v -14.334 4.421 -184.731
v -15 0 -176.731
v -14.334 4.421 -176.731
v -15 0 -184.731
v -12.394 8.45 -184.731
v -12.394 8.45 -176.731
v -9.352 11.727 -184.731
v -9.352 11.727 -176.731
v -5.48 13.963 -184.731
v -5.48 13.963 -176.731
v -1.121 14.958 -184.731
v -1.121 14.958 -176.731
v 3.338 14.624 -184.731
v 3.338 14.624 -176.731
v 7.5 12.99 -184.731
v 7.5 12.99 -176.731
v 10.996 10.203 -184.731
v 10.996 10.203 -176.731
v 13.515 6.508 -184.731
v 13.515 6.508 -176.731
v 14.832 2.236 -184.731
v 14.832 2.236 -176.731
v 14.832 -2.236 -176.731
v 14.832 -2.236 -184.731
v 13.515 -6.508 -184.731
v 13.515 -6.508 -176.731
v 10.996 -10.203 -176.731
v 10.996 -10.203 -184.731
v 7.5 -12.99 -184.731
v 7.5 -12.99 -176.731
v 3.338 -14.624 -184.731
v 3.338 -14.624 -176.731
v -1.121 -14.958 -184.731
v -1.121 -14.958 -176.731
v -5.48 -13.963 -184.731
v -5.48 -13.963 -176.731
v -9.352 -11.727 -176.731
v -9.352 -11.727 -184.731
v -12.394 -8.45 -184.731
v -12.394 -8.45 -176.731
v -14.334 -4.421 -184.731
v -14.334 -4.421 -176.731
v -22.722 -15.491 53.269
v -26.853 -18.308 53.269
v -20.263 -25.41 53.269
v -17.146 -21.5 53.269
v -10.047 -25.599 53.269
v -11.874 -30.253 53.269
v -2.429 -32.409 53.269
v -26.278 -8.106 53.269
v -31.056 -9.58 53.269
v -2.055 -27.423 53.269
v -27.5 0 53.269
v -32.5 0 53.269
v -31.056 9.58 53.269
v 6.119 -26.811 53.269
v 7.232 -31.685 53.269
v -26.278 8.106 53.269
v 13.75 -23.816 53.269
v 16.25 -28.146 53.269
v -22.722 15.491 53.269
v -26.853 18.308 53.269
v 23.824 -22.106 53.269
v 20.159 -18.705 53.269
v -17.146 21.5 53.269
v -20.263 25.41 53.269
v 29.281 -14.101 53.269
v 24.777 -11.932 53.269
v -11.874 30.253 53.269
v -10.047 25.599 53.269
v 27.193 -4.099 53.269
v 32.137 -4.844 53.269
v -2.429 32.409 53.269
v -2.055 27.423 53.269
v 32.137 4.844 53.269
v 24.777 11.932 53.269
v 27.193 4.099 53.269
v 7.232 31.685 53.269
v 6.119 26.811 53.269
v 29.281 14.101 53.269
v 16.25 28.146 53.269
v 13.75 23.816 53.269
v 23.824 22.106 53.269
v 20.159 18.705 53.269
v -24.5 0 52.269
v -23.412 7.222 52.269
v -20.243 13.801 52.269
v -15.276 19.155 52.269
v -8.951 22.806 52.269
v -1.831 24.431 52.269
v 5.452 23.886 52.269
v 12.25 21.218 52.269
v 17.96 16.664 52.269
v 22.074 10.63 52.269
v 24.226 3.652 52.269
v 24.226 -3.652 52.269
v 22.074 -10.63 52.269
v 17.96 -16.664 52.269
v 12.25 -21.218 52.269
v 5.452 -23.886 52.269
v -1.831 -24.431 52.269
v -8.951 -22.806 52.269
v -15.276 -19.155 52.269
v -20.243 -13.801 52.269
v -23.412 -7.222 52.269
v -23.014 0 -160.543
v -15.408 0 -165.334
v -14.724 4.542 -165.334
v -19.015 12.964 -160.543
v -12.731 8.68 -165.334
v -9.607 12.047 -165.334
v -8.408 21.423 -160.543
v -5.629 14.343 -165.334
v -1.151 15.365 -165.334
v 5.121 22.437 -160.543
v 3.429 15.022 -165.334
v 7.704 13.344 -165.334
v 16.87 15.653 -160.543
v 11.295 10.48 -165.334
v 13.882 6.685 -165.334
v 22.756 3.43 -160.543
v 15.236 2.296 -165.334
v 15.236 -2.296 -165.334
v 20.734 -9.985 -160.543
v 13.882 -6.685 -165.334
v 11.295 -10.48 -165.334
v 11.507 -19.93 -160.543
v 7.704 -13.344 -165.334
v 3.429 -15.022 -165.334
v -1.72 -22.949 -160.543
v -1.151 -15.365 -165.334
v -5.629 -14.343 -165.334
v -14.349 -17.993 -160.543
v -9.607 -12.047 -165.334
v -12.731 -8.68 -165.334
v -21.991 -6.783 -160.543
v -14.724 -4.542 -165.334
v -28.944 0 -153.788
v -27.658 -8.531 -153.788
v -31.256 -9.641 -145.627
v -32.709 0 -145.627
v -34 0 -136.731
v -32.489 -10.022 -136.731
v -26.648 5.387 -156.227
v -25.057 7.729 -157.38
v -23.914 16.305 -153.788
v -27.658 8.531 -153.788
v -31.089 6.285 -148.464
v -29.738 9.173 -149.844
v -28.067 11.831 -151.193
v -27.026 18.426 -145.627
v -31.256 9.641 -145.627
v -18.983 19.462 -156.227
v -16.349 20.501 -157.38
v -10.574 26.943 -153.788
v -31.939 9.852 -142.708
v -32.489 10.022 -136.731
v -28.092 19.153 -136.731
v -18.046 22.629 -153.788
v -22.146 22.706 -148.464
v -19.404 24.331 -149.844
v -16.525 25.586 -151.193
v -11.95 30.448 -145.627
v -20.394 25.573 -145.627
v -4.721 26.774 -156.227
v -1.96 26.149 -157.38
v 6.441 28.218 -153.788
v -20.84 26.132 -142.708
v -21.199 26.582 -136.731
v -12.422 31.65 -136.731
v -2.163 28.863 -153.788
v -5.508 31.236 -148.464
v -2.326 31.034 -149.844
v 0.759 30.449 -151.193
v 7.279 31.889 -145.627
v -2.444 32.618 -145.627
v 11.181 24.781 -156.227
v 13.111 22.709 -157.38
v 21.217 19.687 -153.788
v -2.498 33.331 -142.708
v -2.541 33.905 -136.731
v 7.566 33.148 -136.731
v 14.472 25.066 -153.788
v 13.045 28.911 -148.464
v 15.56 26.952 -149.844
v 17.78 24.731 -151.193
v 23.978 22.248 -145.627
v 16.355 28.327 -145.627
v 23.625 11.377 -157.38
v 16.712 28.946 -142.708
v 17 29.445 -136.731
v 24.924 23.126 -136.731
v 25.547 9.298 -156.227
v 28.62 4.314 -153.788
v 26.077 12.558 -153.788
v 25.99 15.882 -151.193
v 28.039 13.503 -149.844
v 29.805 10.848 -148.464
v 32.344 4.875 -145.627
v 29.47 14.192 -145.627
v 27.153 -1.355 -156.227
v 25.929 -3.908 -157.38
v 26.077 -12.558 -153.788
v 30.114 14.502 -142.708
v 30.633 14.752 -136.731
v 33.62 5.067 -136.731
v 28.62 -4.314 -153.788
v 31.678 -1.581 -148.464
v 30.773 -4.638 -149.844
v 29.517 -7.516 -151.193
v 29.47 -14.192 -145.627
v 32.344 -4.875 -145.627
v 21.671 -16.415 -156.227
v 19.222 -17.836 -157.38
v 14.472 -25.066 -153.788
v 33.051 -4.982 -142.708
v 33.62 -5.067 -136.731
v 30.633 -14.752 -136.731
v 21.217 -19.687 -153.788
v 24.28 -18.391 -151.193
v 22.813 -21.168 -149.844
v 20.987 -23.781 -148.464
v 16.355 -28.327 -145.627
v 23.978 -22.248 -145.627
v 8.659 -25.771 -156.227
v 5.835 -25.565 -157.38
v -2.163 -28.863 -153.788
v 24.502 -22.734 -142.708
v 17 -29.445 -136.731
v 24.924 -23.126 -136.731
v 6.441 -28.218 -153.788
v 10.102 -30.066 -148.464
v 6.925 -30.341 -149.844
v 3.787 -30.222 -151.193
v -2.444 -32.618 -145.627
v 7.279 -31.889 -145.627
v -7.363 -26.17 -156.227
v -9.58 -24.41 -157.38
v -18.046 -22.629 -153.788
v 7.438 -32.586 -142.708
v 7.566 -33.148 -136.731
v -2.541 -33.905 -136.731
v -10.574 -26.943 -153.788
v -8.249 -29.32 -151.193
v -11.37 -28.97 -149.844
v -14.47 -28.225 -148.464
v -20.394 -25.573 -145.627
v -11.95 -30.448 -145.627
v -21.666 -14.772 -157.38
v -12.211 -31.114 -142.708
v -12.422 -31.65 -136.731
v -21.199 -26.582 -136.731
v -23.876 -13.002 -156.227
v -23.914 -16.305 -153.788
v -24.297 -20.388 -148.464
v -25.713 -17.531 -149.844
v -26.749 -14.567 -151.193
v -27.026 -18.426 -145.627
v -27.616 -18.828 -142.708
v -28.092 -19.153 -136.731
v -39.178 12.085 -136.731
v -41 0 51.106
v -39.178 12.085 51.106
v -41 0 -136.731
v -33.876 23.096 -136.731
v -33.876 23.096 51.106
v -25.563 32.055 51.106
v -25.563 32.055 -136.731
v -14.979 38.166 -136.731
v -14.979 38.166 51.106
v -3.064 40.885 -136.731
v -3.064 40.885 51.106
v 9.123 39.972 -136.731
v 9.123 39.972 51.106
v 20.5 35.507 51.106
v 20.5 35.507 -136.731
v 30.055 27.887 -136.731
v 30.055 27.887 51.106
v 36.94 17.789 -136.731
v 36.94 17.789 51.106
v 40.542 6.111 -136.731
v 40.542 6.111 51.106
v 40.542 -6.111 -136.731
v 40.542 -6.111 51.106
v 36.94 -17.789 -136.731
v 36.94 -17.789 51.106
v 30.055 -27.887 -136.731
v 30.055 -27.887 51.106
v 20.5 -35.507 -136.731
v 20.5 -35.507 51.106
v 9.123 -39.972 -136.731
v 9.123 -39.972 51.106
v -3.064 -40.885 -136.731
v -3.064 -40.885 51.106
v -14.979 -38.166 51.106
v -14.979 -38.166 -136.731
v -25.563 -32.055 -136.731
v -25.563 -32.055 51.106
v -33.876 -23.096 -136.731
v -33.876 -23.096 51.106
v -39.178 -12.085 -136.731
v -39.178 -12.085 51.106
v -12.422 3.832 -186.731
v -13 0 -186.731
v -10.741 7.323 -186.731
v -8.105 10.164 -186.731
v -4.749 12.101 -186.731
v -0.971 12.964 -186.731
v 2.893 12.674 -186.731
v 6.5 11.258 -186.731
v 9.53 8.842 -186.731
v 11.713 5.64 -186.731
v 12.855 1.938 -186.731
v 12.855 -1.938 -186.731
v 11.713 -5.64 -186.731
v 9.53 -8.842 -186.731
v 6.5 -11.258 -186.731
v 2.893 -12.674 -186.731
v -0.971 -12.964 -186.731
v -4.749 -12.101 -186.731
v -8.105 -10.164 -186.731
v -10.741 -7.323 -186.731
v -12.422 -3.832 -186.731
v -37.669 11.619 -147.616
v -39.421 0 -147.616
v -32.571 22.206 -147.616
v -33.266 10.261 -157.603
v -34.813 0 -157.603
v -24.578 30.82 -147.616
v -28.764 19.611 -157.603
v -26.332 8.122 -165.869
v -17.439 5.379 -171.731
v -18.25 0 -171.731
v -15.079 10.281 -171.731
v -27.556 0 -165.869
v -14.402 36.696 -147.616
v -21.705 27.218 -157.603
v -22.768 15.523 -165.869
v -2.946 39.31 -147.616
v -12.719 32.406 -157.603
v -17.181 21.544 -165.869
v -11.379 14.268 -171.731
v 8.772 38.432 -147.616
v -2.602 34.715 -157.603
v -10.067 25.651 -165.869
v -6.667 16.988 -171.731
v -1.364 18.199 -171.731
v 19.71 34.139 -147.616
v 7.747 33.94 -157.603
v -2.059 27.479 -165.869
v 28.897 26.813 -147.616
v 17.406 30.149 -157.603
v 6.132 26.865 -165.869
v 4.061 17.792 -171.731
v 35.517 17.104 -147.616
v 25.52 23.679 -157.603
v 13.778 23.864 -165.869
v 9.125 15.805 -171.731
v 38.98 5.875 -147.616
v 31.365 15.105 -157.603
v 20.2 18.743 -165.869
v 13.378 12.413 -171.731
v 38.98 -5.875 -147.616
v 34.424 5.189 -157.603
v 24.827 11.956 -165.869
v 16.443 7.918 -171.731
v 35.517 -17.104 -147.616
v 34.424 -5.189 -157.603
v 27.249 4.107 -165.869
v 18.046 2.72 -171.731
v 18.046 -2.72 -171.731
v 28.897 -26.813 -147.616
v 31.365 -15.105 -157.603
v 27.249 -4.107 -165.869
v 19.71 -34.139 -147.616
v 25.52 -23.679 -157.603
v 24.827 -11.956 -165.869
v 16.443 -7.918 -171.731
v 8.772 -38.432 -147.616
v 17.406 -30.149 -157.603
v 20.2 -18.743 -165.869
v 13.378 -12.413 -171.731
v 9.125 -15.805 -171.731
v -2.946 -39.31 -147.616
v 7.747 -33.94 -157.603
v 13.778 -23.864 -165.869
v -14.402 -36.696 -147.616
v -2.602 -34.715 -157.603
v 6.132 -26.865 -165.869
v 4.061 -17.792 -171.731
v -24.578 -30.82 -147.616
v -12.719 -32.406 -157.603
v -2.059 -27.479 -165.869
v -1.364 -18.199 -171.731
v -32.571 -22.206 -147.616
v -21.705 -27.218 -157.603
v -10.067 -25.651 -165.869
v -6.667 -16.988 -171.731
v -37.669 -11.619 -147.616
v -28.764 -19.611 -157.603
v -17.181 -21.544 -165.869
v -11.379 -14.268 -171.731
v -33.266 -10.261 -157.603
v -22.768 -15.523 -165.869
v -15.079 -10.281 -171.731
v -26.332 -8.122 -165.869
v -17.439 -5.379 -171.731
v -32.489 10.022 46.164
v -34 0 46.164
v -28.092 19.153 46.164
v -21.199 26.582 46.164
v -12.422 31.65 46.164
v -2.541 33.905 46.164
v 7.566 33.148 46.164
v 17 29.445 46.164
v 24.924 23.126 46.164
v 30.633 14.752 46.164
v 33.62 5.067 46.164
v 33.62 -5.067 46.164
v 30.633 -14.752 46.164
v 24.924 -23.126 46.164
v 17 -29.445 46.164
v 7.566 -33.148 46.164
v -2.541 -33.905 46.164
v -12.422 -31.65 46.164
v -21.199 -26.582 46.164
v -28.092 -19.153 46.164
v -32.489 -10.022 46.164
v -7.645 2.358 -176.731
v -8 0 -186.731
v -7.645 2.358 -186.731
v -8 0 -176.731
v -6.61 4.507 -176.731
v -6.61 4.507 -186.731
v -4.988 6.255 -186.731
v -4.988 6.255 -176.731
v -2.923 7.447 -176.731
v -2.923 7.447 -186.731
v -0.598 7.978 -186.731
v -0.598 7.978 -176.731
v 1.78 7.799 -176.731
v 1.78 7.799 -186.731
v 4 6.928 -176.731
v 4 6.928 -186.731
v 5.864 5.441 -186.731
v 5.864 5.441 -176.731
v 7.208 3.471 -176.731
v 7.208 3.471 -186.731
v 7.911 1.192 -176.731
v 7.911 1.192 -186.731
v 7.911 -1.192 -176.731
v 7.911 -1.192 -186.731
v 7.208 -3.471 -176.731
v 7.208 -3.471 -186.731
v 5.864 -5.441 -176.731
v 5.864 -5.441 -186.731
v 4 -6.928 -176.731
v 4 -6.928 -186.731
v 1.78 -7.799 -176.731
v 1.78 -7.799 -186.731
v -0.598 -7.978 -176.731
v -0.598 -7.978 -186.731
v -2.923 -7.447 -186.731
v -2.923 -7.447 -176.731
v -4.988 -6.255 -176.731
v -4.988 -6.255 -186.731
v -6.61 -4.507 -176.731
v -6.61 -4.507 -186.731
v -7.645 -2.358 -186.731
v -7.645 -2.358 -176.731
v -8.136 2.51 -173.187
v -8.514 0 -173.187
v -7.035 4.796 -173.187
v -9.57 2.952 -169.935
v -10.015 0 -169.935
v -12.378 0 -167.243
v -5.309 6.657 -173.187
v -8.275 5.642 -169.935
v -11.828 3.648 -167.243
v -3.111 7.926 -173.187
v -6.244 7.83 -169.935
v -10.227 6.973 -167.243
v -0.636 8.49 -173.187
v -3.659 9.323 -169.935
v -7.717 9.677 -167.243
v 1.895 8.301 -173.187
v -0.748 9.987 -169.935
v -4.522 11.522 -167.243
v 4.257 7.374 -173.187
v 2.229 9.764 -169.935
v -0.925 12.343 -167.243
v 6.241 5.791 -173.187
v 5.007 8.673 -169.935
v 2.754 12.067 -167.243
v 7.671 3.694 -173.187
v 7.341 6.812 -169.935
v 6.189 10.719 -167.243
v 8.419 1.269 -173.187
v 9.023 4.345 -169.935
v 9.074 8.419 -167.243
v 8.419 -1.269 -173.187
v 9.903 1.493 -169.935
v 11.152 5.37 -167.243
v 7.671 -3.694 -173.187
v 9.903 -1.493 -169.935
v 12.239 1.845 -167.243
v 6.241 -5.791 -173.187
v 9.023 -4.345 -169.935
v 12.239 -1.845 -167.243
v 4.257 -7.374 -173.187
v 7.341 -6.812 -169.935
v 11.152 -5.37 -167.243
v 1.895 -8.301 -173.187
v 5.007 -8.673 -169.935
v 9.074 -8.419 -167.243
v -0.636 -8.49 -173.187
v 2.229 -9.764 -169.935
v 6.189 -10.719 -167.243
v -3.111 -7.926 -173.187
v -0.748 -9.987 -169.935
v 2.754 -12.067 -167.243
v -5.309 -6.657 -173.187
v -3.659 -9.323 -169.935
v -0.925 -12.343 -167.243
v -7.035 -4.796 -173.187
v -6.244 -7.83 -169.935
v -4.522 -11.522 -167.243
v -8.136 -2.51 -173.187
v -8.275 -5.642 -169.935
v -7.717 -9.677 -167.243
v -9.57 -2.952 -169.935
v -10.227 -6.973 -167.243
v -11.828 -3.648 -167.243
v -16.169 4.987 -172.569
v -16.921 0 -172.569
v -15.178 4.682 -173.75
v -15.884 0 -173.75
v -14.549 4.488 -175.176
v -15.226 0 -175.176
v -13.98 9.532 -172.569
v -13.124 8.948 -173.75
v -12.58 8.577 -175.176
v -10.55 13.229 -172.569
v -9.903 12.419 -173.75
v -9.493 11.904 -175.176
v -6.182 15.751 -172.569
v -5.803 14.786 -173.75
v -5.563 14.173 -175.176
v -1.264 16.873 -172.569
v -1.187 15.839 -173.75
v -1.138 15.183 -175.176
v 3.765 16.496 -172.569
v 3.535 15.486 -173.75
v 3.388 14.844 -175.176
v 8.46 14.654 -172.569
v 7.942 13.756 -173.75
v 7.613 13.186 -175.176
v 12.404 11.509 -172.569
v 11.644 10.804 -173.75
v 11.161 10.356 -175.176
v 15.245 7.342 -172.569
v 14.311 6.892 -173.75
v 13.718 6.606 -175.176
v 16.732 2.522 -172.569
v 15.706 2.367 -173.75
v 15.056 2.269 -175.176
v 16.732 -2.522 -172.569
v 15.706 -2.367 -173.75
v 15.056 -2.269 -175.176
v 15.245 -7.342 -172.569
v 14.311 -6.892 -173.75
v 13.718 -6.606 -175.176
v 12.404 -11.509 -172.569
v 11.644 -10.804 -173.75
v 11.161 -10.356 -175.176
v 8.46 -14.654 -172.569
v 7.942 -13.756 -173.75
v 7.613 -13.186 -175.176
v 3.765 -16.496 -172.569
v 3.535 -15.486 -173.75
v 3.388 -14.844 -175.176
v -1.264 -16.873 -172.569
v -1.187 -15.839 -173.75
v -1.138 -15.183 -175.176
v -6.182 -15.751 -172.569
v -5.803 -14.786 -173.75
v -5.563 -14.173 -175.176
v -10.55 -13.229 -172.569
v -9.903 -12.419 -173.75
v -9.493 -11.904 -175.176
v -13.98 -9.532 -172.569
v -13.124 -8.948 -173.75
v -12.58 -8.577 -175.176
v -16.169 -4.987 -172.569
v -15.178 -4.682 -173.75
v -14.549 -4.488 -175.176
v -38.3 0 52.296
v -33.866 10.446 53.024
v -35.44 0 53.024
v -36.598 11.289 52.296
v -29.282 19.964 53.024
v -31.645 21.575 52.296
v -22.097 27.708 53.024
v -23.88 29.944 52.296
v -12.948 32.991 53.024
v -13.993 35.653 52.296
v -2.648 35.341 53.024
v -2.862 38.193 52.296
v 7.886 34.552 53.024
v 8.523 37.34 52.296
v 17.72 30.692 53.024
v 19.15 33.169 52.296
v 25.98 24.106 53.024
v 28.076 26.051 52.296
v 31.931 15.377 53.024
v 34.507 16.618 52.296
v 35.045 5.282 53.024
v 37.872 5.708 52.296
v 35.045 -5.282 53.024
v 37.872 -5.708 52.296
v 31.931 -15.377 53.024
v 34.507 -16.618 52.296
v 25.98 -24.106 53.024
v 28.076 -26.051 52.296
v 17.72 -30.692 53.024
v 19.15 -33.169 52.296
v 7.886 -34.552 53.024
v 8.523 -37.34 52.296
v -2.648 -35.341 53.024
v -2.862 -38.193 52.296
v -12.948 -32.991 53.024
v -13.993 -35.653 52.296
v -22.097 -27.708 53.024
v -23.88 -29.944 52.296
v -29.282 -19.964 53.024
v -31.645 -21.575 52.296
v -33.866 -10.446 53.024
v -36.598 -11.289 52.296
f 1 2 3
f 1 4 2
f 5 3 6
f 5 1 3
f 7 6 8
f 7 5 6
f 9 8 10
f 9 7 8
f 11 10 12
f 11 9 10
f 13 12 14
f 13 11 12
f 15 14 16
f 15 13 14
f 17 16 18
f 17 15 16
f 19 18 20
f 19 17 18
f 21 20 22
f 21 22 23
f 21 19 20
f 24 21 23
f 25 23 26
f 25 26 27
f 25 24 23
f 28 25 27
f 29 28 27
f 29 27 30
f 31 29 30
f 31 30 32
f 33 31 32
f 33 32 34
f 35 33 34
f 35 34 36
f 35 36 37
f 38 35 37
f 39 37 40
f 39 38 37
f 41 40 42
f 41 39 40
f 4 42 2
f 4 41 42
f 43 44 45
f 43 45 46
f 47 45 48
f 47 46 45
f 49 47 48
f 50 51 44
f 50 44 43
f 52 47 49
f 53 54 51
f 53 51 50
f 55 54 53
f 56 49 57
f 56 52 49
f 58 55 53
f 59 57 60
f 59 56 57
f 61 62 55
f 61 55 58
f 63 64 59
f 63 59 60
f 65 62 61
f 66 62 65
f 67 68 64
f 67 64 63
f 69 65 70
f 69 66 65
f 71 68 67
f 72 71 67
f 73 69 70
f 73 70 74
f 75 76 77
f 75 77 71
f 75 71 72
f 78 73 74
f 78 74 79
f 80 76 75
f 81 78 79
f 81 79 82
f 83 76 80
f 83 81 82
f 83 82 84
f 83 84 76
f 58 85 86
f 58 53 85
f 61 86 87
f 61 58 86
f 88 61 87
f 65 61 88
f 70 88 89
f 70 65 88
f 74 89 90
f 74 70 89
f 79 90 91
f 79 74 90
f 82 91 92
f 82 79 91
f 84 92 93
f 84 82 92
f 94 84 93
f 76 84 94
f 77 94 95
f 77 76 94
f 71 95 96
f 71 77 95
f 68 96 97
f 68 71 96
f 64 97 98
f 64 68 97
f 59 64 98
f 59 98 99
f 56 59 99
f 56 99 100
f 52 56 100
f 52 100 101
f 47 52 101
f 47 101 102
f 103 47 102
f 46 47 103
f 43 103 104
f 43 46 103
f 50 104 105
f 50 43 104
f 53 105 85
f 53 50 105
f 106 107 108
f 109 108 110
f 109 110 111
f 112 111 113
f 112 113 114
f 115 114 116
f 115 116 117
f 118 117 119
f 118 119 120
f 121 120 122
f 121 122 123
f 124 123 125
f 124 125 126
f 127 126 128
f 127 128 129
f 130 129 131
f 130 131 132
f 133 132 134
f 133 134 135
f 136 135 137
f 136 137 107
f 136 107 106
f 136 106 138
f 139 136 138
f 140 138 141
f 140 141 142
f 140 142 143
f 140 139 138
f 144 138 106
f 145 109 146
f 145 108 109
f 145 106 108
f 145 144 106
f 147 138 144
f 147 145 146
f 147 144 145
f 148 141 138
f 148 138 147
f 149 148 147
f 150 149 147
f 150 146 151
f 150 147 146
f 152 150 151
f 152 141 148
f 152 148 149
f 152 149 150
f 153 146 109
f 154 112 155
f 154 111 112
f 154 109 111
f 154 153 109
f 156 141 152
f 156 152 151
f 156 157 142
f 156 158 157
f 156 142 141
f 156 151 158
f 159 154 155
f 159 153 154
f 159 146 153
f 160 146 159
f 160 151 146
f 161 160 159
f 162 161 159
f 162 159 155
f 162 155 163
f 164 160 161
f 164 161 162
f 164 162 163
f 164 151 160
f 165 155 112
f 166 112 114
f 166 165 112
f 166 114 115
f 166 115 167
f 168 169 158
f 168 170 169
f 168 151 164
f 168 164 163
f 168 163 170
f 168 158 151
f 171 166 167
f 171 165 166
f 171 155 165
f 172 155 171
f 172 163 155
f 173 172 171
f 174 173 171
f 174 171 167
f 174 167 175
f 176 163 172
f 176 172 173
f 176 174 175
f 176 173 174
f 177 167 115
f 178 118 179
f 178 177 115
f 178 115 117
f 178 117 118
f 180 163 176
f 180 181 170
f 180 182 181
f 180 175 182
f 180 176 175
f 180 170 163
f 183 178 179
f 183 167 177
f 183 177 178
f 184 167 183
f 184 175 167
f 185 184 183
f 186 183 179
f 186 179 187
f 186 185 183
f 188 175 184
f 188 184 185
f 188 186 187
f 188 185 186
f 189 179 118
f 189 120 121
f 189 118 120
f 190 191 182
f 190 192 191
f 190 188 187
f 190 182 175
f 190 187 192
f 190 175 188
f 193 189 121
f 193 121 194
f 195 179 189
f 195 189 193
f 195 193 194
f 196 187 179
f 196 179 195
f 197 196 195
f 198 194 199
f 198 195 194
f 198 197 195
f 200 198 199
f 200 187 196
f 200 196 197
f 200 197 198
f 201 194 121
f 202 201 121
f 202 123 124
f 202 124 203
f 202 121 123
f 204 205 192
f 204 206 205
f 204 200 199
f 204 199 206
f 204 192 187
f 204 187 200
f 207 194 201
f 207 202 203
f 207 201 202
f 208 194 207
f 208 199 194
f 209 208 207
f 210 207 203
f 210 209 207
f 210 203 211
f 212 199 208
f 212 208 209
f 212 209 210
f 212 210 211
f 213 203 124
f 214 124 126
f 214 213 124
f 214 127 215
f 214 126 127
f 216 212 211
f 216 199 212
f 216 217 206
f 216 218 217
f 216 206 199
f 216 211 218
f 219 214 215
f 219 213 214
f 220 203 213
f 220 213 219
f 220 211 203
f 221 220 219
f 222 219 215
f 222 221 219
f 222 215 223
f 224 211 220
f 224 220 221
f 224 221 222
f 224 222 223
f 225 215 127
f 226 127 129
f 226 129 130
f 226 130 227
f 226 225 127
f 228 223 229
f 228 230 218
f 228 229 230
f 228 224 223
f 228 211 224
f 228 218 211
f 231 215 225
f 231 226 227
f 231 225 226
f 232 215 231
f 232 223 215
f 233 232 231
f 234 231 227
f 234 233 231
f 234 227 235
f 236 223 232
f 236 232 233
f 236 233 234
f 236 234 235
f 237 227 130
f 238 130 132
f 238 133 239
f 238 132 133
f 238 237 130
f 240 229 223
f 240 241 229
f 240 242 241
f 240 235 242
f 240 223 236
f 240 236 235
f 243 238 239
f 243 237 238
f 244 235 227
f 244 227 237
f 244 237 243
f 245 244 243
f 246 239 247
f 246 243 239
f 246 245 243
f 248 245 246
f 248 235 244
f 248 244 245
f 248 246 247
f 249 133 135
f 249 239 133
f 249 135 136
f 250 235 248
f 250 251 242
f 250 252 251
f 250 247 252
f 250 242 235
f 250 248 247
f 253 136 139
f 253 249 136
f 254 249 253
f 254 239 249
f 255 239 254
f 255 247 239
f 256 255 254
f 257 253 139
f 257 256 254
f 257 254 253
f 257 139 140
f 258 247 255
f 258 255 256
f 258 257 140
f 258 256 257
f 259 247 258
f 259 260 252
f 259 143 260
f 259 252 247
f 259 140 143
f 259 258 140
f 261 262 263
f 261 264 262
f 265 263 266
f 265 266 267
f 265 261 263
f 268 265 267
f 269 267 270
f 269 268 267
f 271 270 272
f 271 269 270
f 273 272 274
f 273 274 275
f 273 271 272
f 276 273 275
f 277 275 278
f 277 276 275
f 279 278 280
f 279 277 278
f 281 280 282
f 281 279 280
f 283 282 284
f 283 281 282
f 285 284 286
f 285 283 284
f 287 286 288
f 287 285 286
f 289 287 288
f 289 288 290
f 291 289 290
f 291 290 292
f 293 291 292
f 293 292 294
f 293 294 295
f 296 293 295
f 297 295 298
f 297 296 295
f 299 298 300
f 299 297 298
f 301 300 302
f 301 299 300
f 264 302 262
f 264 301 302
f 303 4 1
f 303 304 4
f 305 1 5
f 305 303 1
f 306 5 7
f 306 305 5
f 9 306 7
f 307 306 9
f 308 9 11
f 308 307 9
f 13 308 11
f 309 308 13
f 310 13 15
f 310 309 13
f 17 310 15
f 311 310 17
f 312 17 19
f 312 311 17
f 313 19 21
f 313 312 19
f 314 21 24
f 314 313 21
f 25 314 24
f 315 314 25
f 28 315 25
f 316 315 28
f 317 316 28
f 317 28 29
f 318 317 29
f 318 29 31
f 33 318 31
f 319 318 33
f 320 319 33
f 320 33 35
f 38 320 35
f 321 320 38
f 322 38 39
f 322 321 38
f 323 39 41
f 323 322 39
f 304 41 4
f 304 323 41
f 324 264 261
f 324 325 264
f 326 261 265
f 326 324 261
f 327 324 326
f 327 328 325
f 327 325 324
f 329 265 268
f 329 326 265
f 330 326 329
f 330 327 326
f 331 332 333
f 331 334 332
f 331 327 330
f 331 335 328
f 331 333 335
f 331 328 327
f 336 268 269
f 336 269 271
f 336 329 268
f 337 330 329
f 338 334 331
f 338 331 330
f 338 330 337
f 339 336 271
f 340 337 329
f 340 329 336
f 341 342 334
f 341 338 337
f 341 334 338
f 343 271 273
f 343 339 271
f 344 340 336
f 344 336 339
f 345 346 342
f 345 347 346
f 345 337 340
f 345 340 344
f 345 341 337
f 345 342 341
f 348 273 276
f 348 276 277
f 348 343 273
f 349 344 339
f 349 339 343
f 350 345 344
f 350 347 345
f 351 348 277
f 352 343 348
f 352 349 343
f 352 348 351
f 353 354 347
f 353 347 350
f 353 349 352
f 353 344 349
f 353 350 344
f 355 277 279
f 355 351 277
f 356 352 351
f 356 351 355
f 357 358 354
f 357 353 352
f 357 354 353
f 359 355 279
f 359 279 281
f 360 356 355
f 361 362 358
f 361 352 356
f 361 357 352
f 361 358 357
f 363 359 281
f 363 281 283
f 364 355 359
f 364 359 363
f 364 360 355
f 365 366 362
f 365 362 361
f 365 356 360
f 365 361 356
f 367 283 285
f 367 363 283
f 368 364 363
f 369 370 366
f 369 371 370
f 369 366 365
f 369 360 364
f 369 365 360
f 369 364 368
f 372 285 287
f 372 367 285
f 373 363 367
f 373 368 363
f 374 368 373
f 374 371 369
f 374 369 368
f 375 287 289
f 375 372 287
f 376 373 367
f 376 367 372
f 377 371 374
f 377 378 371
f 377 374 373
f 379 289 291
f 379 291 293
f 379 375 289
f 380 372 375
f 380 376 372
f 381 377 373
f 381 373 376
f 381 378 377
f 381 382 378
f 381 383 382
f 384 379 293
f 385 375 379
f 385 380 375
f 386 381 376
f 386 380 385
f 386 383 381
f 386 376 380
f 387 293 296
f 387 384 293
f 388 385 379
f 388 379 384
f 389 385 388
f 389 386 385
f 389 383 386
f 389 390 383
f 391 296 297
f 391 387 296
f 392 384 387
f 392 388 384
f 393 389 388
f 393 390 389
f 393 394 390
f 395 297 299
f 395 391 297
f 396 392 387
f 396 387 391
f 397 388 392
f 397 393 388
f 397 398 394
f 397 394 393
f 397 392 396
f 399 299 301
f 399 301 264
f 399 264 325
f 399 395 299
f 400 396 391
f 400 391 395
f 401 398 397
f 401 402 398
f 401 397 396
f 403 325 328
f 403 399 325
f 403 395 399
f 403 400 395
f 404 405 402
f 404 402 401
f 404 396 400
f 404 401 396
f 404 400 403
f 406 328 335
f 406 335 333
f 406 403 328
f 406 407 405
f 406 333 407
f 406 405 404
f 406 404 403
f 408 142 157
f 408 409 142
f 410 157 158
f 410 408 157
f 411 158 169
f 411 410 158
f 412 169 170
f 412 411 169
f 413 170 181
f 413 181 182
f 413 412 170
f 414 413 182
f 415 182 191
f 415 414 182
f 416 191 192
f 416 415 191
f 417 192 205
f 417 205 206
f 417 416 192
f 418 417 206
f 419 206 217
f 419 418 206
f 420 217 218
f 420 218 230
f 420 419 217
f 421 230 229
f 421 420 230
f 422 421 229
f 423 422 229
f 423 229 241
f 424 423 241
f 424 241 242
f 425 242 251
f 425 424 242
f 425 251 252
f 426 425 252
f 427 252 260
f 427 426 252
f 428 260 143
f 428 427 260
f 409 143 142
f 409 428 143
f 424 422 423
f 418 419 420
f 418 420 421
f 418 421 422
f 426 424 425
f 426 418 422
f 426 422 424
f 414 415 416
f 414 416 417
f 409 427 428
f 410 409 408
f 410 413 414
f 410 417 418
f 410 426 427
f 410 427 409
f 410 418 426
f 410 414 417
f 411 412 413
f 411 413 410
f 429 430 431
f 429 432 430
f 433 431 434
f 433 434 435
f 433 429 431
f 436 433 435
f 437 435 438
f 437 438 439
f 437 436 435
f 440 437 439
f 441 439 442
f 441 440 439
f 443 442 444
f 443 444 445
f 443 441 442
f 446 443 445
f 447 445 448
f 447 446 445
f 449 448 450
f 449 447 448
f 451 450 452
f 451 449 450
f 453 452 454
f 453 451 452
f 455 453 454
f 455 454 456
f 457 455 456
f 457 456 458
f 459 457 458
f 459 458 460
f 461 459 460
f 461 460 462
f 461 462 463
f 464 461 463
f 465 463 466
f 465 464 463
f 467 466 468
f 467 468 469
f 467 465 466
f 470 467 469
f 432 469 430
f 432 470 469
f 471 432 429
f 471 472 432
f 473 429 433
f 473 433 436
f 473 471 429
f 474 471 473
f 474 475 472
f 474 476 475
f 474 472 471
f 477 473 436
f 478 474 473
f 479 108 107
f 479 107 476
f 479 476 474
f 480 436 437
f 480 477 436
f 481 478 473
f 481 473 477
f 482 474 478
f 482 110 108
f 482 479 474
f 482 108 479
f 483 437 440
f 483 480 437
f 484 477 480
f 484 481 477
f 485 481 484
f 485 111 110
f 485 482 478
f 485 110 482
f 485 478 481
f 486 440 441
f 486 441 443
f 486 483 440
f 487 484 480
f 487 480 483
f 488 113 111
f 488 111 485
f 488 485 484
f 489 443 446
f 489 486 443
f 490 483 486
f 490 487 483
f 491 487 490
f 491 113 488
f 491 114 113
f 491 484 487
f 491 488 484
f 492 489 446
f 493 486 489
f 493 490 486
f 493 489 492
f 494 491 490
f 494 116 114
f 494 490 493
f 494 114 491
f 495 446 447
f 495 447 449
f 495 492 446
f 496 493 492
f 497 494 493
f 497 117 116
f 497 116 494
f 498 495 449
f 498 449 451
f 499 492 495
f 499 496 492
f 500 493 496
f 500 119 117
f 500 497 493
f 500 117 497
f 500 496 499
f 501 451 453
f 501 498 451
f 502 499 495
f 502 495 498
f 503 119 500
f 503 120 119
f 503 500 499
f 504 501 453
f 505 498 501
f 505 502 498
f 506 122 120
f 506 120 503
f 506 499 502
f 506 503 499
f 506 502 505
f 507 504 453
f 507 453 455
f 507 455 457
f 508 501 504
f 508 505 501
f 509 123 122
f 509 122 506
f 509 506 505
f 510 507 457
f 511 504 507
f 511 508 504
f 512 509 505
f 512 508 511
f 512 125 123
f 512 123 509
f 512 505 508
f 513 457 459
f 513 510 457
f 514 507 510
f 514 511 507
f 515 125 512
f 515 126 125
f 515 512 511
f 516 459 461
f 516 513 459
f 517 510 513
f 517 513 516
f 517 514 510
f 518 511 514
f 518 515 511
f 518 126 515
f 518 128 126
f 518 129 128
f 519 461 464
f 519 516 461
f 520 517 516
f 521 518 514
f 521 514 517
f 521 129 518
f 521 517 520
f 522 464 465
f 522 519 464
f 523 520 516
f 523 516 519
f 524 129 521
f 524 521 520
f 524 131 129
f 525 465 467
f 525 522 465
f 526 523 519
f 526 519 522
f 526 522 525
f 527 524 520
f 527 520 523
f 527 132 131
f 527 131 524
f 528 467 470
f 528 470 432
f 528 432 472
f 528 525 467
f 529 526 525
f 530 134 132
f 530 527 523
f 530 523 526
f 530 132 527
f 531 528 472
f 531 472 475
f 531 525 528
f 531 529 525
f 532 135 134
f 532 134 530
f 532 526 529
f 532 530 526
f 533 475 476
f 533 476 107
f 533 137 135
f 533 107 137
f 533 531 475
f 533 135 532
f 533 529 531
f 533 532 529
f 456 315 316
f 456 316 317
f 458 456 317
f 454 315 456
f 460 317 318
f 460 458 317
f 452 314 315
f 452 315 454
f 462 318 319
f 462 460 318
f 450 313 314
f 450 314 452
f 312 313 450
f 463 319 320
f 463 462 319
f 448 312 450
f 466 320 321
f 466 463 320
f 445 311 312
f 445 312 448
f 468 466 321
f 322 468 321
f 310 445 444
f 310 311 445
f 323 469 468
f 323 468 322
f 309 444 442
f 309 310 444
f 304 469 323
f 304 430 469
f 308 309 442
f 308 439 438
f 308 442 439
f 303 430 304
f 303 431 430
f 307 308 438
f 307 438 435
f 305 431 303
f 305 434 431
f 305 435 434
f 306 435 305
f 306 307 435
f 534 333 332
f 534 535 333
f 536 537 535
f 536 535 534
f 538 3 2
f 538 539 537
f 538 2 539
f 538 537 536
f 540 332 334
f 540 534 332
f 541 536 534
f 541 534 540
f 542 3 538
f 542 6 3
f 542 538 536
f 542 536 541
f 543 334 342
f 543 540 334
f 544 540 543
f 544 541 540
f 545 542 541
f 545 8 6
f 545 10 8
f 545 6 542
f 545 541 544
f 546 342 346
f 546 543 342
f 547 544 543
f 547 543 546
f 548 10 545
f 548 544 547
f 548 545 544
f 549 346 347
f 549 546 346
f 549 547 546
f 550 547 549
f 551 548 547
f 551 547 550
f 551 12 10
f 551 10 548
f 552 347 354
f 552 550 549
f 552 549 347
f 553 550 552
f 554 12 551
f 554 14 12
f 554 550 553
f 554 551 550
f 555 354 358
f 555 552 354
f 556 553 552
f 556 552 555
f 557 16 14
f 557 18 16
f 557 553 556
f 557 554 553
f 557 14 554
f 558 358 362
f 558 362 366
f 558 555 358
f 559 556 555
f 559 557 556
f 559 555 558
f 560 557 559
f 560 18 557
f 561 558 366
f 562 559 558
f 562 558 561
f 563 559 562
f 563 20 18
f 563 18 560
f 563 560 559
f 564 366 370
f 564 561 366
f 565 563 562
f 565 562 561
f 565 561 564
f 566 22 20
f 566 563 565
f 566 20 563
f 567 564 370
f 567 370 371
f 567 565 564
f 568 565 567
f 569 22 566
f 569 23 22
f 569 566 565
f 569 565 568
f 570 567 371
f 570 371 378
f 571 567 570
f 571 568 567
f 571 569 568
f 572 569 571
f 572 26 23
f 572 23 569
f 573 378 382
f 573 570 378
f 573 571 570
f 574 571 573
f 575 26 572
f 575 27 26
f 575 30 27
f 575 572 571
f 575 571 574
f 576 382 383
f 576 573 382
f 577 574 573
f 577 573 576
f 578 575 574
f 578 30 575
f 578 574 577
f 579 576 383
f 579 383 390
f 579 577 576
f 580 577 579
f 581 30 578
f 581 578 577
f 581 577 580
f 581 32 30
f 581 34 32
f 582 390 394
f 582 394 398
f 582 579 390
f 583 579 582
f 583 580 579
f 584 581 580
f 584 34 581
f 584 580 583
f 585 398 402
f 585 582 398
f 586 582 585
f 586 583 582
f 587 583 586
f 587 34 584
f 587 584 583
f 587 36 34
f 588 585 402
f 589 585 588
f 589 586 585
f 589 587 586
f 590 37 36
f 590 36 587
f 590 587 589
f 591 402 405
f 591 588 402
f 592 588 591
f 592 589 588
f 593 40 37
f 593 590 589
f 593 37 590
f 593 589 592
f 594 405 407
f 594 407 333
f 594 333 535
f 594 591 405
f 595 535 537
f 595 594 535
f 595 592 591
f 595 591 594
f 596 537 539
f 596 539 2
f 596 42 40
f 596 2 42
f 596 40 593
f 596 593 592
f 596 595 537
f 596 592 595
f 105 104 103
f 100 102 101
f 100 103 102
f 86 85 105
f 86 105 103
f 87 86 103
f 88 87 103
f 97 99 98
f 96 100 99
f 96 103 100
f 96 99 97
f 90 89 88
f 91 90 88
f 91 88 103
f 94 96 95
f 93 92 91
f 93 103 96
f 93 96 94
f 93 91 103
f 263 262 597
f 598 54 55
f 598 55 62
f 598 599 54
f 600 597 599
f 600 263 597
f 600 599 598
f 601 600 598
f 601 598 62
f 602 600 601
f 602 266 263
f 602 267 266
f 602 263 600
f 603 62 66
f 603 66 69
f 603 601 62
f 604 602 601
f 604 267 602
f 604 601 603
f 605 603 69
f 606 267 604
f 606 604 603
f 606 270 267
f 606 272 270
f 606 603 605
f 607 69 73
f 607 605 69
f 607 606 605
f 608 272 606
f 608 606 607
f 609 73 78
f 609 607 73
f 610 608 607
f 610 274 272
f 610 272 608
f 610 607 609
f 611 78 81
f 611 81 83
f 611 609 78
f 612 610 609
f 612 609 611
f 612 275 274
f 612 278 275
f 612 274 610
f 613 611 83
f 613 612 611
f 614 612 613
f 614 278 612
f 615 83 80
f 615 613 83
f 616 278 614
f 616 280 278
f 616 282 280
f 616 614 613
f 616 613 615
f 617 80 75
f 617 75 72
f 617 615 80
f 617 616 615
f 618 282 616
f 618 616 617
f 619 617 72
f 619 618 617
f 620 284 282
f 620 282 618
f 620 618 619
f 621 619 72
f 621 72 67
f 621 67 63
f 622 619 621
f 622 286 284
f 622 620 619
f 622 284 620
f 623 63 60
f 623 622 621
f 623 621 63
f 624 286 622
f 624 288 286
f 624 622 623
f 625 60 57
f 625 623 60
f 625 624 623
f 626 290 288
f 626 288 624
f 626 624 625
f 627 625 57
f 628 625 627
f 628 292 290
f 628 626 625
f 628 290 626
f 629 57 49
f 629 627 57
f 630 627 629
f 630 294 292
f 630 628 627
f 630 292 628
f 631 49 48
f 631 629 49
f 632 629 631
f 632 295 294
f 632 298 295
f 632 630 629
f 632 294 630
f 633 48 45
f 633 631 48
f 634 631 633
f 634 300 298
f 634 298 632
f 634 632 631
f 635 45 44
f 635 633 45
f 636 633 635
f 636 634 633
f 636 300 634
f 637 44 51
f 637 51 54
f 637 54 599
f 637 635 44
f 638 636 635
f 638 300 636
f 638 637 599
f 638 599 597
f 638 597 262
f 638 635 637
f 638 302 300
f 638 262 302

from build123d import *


with BuildPart() as part:
    # Sketch1 → Revolve1 (revolve)
    with BuildSketch(Plane(origin=(0, 0, 0), x_dir=(1, 0, 0), z_dir=(0, 1, 0))):
        with BuildLine():
            Line((-34, -46.163818636), (0, -46.163818636))
            Line((0, -46.163818636), (0, -52.268618281))
            Line((0, -52.268618281), (-24.5, -52.268618281))
            Line((-24.5, -52.268618281), (-27.5, -53.268618281))
            Line((-27.5, -53.268618281), (-32.5, -53.268618281))
            ThreePointArc((-32.5, -53.268618281), (-36.885372769, -52.719543337), (-41, -51.106217468))
            Line((-41, -51.106217468), (-41, 136.731381719))
            ThreePointArc((-41, 136.731381719), (-34.81270119, 157.603387492), (-18.25, 171.731381719))
            ThreePointArc((-18.25, 171.731381719), (-15.88389983, 173.749666608), (-15, 176.731381719))
            Line((-15, 176.731381719), (-15, 184.731381719))
            Line((-15, 184.731381719), (-13, 186.731381719))
            Line((-13, 186.731381719), (-8, 186.731381719))
            Line((-8, 186.731381719), (-8, 179.731381719))
            Line((-8, 179.731381719), (-8, 176.731381719))
            ThreePointArc((-8, 176.731381719), (-10.014794516, 169.934748154), (-15.408172232, 165.33419367))
            ThreePointArc((-15.408172232, 165.33419367), (-28.943595876, 153.788469038), (-34, 136.731381719))
            Line((-34, 136.731381719), (-34, -46.163818636))
        make_face()
    revolve(axis=Axis((0, 0, 52.268618281), (0, 0, -1)))


solid = part.part
